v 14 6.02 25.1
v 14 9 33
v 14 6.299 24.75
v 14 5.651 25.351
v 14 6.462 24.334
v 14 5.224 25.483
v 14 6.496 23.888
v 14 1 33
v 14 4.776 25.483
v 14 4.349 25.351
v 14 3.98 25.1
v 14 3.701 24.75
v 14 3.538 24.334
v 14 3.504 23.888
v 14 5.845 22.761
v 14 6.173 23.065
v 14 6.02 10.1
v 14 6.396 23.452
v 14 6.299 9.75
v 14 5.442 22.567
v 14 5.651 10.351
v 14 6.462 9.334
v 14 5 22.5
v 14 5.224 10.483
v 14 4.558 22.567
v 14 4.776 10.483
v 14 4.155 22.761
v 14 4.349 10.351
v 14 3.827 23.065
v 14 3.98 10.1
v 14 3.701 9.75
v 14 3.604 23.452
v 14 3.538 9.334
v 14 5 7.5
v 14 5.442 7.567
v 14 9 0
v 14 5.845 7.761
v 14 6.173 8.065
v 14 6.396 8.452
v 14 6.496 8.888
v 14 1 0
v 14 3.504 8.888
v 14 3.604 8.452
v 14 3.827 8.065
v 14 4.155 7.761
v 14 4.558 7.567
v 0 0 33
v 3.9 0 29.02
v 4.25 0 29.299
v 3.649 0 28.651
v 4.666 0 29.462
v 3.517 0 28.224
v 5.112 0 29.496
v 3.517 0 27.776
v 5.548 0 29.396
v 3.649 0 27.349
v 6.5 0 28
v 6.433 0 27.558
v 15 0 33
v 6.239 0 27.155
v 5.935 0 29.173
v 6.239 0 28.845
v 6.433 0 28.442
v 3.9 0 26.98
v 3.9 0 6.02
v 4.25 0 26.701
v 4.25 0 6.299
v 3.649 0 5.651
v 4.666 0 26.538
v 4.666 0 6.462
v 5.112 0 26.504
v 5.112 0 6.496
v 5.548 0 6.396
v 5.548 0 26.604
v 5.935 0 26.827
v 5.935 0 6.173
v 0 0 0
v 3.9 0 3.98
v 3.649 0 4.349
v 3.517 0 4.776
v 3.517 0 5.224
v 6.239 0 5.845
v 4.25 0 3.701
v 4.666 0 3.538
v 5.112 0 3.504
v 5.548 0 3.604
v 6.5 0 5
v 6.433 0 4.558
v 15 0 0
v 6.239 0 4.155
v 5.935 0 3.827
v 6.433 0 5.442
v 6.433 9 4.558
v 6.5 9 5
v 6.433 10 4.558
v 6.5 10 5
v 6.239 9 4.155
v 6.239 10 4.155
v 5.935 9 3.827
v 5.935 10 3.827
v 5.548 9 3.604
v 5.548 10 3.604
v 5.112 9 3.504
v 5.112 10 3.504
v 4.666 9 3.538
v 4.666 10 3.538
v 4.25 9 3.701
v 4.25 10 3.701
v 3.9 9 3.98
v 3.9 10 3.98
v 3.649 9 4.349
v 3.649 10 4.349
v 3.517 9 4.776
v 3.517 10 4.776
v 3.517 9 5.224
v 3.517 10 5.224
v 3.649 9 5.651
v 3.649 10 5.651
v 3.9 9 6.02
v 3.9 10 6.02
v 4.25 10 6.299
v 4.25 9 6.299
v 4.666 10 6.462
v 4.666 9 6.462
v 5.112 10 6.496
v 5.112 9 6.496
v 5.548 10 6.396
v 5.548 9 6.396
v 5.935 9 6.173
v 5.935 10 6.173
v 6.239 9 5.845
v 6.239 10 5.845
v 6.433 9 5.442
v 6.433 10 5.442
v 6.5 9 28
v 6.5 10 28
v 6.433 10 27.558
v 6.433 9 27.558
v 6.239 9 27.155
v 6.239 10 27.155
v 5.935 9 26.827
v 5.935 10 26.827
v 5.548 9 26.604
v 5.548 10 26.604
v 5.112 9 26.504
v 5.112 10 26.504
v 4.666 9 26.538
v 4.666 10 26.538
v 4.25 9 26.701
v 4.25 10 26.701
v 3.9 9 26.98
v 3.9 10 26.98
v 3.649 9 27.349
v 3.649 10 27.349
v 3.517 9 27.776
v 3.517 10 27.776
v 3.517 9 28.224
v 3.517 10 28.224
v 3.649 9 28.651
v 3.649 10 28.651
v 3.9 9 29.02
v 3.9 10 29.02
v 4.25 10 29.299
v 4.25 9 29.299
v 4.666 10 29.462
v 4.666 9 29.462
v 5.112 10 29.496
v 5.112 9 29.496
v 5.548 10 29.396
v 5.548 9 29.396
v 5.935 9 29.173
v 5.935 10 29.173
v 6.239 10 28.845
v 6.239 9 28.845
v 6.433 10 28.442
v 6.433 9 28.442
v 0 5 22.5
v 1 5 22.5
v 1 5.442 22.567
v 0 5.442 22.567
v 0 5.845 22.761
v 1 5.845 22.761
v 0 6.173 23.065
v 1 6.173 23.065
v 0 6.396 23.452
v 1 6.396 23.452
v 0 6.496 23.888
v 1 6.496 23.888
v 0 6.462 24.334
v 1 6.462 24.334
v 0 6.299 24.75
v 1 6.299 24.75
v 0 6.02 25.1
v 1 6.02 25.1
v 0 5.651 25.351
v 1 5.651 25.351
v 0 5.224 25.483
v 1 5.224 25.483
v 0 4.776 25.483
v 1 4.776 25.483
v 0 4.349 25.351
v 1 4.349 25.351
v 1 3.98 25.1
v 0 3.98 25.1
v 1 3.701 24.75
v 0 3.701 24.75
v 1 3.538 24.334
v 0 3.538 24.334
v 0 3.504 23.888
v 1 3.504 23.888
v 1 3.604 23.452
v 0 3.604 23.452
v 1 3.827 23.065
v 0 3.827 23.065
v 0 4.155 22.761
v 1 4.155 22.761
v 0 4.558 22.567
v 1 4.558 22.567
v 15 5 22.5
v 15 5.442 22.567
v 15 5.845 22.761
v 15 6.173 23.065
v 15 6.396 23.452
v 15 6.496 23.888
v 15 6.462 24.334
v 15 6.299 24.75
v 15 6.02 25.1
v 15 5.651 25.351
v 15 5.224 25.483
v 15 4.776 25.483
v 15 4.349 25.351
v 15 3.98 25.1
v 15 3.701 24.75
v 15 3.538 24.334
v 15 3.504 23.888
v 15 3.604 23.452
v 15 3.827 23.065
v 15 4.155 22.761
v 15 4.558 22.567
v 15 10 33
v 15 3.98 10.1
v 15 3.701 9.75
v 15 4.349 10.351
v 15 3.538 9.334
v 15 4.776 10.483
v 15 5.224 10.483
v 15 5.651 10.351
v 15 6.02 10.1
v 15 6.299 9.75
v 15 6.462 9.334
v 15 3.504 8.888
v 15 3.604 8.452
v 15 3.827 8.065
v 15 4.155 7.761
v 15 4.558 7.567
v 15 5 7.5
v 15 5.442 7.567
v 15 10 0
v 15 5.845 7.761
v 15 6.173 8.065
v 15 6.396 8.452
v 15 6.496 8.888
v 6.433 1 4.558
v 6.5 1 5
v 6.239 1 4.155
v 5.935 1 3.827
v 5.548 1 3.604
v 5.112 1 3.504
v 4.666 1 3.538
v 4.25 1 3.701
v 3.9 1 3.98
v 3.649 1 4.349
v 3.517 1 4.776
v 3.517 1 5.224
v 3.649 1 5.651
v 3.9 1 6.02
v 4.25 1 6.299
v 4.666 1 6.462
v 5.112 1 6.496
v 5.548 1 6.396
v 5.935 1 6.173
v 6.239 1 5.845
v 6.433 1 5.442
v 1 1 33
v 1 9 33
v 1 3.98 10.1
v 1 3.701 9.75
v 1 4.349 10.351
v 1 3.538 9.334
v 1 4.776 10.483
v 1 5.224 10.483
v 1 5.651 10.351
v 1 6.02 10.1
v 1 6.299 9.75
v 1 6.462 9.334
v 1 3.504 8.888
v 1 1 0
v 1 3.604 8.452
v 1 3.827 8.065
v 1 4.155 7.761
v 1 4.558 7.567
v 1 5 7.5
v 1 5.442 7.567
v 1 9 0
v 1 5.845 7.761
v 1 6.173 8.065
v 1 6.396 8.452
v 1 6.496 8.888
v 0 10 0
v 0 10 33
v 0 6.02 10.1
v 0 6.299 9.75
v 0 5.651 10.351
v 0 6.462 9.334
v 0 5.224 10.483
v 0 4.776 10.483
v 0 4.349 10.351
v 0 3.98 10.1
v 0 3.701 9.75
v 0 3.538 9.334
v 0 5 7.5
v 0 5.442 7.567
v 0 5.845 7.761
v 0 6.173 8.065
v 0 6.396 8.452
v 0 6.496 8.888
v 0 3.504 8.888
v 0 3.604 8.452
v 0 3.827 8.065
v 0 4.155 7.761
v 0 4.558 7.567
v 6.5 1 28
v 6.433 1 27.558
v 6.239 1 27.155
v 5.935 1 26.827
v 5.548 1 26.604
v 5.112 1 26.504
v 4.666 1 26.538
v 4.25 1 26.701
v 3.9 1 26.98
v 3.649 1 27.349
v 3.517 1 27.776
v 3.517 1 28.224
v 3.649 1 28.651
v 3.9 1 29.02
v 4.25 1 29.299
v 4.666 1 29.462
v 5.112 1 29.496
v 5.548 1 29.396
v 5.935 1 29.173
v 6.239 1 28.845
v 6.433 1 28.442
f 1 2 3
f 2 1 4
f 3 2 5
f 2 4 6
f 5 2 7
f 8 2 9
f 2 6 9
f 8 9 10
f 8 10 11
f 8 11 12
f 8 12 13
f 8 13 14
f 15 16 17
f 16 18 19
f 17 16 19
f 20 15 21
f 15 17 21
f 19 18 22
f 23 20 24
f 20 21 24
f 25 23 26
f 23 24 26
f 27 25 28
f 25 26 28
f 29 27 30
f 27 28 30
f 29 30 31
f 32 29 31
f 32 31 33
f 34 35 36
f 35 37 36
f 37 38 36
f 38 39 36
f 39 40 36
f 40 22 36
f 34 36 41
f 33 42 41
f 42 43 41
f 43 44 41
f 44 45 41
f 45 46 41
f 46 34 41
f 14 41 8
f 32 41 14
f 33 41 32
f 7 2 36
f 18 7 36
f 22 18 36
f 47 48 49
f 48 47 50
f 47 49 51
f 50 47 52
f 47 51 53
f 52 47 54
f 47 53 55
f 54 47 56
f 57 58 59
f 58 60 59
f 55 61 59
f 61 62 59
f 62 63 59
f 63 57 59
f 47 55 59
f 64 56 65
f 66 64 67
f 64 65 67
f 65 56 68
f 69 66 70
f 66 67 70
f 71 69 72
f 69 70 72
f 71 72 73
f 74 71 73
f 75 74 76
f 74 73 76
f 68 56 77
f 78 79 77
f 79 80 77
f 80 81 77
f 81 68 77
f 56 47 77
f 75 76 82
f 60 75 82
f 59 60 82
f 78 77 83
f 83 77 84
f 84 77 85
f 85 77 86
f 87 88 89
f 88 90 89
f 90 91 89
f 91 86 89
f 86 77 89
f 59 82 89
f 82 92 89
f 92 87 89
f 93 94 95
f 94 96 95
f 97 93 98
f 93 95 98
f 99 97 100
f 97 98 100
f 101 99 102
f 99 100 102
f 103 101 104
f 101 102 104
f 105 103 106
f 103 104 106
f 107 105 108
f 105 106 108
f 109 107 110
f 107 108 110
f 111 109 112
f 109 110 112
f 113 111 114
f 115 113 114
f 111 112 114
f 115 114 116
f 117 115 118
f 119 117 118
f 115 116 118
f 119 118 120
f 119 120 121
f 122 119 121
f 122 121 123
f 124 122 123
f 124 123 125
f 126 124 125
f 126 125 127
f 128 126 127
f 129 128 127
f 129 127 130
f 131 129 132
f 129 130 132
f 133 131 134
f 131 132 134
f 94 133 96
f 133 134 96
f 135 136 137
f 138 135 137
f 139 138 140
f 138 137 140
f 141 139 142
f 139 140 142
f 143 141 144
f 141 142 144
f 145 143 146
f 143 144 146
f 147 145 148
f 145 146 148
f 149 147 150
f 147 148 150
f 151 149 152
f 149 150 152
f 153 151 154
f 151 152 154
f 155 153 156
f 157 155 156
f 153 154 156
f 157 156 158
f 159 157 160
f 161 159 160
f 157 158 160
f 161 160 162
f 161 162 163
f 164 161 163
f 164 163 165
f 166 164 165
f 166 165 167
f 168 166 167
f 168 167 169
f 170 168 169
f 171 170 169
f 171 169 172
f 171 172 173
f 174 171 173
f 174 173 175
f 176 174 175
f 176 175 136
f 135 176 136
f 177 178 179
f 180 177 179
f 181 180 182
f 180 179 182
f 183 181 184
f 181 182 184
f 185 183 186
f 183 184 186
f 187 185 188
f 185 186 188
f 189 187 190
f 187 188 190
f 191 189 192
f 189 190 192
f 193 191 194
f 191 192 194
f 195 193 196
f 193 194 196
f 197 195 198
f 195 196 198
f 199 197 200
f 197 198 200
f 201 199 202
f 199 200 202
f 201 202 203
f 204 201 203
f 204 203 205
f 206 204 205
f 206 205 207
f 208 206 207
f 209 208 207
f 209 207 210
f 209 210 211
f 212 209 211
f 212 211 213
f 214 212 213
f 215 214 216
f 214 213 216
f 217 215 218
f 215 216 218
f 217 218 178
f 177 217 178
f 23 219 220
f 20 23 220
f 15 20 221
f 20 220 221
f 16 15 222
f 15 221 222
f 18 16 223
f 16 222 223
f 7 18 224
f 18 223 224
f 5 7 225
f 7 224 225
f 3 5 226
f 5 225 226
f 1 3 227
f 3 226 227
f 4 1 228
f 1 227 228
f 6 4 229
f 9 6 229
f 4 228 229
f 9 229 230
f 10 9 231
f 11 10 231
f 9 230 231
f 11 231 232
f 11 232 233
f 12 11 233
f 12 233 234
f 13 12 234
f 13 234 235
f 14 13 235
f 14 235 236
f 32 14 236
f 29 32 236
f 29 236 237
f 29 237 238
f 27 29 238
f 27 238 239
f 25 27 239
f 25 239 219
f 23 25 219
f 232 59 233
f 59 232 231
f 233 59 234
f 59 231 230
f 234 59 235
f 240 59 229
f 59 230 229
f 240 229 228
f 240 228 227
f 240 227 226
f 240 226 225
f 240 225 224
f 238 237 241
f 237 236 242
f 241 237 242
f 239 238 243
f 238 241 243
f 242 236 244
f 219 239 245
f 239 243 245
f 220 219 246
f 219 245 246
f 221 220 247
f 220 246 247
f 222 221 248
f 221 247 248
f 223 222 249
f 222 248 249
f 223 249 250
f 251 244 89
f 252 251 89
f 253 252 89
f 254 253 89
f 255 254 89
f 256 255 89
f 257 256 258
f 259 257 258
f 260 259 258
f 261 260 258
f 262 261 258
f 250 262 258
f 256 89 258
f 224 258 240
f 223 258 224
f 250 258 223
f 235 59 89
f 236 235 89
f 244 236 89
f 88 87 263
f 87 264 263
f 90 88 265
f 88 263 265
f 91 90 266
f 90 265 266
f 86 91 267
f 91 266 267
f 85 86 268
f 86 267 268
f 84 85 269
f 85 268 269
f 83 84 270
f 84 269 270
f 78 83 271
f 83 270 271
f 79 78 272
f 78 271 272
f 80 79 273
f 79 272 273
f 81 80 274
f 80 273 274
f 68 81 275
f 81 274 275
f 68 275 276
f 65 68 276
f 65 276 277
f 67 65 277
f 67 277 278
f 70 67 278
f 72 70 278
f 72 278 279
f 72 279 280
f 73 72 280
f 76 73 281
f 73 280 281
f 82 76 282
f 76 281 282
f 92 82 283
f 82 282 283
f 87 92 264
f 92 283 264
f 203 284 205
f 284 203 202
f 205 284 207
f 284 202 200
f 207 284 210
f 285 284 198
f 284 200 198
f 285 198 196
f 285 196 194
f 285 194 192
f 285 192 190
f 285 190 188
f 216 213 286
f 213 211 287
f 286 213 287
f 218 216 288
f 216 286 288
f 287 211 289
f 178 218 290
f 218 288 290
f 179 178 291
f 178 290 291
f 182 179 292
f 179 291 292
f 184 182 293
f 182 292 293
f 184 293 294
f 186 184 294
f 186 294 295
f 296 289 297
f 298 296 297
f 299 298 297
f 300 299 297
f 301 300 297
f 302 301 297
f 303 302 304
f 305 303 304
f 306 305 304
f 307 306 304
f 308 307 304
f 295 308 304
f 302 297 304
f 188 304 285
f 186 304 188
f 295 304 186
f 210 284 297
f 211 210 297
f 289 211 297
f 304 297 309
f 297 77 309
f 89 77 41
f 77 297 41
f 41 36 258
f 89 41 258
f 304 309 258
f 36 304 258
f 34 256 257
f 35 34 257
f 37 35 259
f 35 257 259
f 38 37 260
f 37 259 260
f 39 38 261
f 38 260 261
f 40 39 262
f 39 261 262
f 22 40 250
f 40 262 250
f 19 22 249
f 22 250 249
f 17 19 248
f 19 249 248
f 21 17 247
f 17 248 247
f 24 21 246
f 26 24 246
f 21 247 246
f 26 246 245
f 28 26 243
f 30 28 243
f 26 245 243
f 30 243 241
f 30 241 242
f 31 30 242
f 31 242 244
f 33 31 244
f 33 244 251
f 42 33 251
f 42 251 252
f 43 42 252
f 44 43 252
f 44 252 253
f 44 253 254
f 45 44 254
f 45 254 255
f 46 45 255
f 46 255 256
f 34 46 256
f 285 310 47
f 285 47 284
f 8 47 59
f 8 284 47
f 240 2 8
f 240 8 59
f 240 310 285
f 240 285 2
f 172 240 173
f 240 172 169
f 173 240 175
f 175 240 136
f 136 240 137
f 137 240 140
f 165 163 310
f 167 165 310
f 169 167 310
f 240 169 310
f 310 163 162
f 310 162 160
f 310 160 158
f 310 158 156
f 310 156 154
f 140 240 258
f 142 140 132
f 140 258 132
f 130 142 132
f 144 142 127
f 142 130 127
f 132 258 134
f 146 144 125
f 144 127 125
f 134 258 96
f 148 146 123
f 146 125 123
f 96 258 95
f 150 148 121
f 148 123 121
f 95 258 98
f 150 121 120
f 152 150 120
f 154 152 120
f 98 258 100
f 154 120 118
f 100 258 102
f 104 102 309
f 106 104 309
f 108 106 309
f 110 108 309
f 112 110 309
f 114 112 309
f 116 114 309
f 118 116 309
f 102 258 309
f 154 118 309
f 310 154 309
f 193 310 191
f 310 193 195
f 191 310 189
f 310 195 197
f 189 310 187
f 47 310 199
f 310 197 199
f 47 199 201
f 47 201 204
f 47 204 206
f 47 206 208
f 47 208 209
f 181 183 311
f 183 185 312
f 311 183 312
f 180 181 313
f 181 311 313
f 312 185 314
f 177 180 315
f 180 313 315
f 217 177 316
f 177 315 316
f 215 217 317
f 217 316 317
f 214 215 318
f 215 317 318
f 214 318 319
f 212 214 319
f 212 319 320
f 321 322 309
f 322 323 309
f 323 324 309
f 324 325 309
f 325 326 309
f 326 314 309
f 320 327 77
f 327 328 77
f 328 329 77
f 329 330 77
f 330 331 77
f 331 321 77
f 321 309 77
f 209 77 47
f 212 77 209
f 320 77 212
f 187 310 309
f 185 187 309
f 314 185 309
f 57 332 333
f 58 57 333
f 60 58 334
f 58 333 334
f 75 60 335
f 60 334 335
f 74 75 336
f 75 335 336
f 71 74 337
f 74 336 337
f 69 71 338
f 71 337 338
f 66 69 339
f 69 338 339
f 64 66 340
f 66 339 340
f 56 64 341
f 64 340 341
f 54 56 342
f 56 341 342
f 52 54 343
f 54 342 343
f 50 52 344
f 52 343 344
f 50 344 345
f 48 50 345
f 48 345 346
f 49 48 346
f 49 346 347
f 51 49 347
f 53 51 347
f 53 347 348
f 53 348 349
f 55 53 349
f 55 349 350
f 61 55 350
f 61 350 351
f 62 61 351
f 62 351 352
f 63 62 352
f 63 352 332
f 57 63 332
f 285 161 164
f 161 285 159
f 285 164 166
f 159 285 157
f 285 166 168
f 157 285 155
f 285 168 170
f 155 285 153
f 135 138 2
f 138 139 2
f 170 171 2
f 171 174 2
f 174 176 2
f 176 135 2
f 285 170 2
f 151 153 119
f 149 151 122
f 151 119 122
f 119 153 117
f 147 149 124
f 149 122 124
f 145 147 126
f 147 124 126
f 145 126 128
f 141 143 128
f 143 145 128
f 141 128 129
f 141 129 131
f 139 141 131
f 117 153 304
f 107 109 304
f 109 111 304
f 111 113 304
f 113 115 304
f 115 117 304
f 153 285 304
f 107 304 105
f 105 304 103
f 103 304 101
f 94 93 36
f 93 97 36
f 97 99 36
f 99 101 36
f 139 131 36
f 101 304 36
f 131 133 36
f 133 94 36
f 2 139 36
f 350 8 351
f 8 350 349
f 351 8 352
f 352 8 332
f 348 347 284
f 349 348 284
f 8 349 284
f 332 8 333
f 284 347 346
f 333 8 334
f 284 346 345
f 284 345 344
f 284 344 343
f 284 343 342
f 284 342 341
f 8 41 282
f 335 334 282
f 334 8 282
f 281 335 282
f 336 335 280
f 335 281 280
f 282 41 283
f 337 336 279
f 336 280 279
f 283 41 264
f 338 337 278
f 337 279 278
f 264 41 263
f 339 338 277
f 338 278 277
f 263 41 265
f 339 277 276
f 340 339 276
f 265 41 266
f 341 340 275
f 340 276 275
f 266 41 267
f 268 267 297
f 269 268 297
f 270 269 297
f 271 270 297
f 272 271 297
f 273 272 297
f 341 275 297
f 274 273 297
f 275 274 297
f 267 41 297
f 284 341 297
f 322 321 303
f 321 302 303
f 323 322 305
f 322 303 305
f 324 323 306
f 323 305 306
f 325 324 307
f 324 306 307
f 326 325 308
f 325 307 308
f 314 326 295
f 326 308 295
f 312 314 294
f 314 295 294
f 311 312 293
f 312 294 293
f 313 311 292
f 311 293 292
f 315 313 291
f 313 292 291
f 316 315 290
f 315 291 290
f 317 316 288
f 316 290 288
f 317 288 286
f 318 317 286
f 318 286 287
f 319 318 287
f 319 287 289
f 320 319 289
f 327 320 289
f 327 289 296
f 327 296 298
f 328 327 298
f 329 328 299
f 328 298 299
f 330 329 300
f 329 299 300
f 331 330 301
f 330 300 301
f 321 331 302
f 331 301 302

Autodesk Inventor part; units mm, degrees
ref_plane "YZ Plane" through (0, 0, 0) normal (1, 0, 0) x (0, 1, 0)
ref_plane "XZ Plane" through (0, 0, 0) normal (0, 1, 0) x (-1, 0, 0)
ref_plane "XY Plane" through (0, 0, 0) normal (0, 0, 1) x (1, 0, 0)
sketch "Sketch1" plane through (0, 0, 0) normal (0, 0, 1) x (1, 0, 0)
  line L0 (0, 0) -> (15, 0)
  line L1 (15, 0) -> (15, 10)
  line L2 (15, 10) -> (0, 10)
  line L3 (0, 10) -> (0, 0)
  line L4 (1, 9) -> (14, 9)
  line L5 (14, 9) -> (14, 1)
  line L6 (14, 1) -> (1, 1)
  line L7 (1, 1) -> (1, 9)
  dimension "d0" = 15
  dimension "d1" = 10
  dimension "d2" = 13
  dimension "d3" = 8
  dimension "d4" = 1
  dimension "d5" = 1
extrude "Extrusion1" add sketch "Sketch1" along normal blind 33
sketch "Sketch2" plane through (0, 10, 0) normal (0, 1, 0) x (1, 0, 0)
  line L0 (15, 0) -> (0, 0) projected
  line L1 (0, 0) -> (0, -33) projected
  line L2 (15, -33) -> (0, -33) projected
  line L3 (15, 0) -> (15, -33) projected
  circle A0 centre (5, -5) radius 1.5
  circle A1 centre (5, -28) radius 1.5
  dimension "d8" = 3
  dimension "d9" = 3
  dimension "d10" = 5
  dimension "d11" = 5
  dimension "d12" = 5
  dimension "d13" = 5
extrude "Extrusion2" cut sketch "Sketch2" against normal up to surface (10 mm away) contours A0 | A1
sketch "Sketch3" plane through (15, 0, 0) normal (1, 0, 0) x (0, 0, -1)
  line L0 (0, 0) -> (0, 10) projected
  line L1 (0, 10) -> (-33, 10) projected
  line L2 (-33, 0) -> (-33, 10) projected
  line L3 (0, 0) -> (-33, 0) projected
  circle A0 centre (-9, 5) radius 1.5
  circle A1 centre (-24, 5) radius 1.5
  dimension "d16" = 3
  dimension "d17" = 5
  dimension "d18" = 9
  dimension "d21" = 3
  dimension "d22" = 5
  dimension "d23" = 9
extrude "Extrusion3" cut sketch "Sketch3" against normal up to surface (15 mm away) contours A0 | A1
properties part number "profile2" material "Aluminum 6061, Welded"
